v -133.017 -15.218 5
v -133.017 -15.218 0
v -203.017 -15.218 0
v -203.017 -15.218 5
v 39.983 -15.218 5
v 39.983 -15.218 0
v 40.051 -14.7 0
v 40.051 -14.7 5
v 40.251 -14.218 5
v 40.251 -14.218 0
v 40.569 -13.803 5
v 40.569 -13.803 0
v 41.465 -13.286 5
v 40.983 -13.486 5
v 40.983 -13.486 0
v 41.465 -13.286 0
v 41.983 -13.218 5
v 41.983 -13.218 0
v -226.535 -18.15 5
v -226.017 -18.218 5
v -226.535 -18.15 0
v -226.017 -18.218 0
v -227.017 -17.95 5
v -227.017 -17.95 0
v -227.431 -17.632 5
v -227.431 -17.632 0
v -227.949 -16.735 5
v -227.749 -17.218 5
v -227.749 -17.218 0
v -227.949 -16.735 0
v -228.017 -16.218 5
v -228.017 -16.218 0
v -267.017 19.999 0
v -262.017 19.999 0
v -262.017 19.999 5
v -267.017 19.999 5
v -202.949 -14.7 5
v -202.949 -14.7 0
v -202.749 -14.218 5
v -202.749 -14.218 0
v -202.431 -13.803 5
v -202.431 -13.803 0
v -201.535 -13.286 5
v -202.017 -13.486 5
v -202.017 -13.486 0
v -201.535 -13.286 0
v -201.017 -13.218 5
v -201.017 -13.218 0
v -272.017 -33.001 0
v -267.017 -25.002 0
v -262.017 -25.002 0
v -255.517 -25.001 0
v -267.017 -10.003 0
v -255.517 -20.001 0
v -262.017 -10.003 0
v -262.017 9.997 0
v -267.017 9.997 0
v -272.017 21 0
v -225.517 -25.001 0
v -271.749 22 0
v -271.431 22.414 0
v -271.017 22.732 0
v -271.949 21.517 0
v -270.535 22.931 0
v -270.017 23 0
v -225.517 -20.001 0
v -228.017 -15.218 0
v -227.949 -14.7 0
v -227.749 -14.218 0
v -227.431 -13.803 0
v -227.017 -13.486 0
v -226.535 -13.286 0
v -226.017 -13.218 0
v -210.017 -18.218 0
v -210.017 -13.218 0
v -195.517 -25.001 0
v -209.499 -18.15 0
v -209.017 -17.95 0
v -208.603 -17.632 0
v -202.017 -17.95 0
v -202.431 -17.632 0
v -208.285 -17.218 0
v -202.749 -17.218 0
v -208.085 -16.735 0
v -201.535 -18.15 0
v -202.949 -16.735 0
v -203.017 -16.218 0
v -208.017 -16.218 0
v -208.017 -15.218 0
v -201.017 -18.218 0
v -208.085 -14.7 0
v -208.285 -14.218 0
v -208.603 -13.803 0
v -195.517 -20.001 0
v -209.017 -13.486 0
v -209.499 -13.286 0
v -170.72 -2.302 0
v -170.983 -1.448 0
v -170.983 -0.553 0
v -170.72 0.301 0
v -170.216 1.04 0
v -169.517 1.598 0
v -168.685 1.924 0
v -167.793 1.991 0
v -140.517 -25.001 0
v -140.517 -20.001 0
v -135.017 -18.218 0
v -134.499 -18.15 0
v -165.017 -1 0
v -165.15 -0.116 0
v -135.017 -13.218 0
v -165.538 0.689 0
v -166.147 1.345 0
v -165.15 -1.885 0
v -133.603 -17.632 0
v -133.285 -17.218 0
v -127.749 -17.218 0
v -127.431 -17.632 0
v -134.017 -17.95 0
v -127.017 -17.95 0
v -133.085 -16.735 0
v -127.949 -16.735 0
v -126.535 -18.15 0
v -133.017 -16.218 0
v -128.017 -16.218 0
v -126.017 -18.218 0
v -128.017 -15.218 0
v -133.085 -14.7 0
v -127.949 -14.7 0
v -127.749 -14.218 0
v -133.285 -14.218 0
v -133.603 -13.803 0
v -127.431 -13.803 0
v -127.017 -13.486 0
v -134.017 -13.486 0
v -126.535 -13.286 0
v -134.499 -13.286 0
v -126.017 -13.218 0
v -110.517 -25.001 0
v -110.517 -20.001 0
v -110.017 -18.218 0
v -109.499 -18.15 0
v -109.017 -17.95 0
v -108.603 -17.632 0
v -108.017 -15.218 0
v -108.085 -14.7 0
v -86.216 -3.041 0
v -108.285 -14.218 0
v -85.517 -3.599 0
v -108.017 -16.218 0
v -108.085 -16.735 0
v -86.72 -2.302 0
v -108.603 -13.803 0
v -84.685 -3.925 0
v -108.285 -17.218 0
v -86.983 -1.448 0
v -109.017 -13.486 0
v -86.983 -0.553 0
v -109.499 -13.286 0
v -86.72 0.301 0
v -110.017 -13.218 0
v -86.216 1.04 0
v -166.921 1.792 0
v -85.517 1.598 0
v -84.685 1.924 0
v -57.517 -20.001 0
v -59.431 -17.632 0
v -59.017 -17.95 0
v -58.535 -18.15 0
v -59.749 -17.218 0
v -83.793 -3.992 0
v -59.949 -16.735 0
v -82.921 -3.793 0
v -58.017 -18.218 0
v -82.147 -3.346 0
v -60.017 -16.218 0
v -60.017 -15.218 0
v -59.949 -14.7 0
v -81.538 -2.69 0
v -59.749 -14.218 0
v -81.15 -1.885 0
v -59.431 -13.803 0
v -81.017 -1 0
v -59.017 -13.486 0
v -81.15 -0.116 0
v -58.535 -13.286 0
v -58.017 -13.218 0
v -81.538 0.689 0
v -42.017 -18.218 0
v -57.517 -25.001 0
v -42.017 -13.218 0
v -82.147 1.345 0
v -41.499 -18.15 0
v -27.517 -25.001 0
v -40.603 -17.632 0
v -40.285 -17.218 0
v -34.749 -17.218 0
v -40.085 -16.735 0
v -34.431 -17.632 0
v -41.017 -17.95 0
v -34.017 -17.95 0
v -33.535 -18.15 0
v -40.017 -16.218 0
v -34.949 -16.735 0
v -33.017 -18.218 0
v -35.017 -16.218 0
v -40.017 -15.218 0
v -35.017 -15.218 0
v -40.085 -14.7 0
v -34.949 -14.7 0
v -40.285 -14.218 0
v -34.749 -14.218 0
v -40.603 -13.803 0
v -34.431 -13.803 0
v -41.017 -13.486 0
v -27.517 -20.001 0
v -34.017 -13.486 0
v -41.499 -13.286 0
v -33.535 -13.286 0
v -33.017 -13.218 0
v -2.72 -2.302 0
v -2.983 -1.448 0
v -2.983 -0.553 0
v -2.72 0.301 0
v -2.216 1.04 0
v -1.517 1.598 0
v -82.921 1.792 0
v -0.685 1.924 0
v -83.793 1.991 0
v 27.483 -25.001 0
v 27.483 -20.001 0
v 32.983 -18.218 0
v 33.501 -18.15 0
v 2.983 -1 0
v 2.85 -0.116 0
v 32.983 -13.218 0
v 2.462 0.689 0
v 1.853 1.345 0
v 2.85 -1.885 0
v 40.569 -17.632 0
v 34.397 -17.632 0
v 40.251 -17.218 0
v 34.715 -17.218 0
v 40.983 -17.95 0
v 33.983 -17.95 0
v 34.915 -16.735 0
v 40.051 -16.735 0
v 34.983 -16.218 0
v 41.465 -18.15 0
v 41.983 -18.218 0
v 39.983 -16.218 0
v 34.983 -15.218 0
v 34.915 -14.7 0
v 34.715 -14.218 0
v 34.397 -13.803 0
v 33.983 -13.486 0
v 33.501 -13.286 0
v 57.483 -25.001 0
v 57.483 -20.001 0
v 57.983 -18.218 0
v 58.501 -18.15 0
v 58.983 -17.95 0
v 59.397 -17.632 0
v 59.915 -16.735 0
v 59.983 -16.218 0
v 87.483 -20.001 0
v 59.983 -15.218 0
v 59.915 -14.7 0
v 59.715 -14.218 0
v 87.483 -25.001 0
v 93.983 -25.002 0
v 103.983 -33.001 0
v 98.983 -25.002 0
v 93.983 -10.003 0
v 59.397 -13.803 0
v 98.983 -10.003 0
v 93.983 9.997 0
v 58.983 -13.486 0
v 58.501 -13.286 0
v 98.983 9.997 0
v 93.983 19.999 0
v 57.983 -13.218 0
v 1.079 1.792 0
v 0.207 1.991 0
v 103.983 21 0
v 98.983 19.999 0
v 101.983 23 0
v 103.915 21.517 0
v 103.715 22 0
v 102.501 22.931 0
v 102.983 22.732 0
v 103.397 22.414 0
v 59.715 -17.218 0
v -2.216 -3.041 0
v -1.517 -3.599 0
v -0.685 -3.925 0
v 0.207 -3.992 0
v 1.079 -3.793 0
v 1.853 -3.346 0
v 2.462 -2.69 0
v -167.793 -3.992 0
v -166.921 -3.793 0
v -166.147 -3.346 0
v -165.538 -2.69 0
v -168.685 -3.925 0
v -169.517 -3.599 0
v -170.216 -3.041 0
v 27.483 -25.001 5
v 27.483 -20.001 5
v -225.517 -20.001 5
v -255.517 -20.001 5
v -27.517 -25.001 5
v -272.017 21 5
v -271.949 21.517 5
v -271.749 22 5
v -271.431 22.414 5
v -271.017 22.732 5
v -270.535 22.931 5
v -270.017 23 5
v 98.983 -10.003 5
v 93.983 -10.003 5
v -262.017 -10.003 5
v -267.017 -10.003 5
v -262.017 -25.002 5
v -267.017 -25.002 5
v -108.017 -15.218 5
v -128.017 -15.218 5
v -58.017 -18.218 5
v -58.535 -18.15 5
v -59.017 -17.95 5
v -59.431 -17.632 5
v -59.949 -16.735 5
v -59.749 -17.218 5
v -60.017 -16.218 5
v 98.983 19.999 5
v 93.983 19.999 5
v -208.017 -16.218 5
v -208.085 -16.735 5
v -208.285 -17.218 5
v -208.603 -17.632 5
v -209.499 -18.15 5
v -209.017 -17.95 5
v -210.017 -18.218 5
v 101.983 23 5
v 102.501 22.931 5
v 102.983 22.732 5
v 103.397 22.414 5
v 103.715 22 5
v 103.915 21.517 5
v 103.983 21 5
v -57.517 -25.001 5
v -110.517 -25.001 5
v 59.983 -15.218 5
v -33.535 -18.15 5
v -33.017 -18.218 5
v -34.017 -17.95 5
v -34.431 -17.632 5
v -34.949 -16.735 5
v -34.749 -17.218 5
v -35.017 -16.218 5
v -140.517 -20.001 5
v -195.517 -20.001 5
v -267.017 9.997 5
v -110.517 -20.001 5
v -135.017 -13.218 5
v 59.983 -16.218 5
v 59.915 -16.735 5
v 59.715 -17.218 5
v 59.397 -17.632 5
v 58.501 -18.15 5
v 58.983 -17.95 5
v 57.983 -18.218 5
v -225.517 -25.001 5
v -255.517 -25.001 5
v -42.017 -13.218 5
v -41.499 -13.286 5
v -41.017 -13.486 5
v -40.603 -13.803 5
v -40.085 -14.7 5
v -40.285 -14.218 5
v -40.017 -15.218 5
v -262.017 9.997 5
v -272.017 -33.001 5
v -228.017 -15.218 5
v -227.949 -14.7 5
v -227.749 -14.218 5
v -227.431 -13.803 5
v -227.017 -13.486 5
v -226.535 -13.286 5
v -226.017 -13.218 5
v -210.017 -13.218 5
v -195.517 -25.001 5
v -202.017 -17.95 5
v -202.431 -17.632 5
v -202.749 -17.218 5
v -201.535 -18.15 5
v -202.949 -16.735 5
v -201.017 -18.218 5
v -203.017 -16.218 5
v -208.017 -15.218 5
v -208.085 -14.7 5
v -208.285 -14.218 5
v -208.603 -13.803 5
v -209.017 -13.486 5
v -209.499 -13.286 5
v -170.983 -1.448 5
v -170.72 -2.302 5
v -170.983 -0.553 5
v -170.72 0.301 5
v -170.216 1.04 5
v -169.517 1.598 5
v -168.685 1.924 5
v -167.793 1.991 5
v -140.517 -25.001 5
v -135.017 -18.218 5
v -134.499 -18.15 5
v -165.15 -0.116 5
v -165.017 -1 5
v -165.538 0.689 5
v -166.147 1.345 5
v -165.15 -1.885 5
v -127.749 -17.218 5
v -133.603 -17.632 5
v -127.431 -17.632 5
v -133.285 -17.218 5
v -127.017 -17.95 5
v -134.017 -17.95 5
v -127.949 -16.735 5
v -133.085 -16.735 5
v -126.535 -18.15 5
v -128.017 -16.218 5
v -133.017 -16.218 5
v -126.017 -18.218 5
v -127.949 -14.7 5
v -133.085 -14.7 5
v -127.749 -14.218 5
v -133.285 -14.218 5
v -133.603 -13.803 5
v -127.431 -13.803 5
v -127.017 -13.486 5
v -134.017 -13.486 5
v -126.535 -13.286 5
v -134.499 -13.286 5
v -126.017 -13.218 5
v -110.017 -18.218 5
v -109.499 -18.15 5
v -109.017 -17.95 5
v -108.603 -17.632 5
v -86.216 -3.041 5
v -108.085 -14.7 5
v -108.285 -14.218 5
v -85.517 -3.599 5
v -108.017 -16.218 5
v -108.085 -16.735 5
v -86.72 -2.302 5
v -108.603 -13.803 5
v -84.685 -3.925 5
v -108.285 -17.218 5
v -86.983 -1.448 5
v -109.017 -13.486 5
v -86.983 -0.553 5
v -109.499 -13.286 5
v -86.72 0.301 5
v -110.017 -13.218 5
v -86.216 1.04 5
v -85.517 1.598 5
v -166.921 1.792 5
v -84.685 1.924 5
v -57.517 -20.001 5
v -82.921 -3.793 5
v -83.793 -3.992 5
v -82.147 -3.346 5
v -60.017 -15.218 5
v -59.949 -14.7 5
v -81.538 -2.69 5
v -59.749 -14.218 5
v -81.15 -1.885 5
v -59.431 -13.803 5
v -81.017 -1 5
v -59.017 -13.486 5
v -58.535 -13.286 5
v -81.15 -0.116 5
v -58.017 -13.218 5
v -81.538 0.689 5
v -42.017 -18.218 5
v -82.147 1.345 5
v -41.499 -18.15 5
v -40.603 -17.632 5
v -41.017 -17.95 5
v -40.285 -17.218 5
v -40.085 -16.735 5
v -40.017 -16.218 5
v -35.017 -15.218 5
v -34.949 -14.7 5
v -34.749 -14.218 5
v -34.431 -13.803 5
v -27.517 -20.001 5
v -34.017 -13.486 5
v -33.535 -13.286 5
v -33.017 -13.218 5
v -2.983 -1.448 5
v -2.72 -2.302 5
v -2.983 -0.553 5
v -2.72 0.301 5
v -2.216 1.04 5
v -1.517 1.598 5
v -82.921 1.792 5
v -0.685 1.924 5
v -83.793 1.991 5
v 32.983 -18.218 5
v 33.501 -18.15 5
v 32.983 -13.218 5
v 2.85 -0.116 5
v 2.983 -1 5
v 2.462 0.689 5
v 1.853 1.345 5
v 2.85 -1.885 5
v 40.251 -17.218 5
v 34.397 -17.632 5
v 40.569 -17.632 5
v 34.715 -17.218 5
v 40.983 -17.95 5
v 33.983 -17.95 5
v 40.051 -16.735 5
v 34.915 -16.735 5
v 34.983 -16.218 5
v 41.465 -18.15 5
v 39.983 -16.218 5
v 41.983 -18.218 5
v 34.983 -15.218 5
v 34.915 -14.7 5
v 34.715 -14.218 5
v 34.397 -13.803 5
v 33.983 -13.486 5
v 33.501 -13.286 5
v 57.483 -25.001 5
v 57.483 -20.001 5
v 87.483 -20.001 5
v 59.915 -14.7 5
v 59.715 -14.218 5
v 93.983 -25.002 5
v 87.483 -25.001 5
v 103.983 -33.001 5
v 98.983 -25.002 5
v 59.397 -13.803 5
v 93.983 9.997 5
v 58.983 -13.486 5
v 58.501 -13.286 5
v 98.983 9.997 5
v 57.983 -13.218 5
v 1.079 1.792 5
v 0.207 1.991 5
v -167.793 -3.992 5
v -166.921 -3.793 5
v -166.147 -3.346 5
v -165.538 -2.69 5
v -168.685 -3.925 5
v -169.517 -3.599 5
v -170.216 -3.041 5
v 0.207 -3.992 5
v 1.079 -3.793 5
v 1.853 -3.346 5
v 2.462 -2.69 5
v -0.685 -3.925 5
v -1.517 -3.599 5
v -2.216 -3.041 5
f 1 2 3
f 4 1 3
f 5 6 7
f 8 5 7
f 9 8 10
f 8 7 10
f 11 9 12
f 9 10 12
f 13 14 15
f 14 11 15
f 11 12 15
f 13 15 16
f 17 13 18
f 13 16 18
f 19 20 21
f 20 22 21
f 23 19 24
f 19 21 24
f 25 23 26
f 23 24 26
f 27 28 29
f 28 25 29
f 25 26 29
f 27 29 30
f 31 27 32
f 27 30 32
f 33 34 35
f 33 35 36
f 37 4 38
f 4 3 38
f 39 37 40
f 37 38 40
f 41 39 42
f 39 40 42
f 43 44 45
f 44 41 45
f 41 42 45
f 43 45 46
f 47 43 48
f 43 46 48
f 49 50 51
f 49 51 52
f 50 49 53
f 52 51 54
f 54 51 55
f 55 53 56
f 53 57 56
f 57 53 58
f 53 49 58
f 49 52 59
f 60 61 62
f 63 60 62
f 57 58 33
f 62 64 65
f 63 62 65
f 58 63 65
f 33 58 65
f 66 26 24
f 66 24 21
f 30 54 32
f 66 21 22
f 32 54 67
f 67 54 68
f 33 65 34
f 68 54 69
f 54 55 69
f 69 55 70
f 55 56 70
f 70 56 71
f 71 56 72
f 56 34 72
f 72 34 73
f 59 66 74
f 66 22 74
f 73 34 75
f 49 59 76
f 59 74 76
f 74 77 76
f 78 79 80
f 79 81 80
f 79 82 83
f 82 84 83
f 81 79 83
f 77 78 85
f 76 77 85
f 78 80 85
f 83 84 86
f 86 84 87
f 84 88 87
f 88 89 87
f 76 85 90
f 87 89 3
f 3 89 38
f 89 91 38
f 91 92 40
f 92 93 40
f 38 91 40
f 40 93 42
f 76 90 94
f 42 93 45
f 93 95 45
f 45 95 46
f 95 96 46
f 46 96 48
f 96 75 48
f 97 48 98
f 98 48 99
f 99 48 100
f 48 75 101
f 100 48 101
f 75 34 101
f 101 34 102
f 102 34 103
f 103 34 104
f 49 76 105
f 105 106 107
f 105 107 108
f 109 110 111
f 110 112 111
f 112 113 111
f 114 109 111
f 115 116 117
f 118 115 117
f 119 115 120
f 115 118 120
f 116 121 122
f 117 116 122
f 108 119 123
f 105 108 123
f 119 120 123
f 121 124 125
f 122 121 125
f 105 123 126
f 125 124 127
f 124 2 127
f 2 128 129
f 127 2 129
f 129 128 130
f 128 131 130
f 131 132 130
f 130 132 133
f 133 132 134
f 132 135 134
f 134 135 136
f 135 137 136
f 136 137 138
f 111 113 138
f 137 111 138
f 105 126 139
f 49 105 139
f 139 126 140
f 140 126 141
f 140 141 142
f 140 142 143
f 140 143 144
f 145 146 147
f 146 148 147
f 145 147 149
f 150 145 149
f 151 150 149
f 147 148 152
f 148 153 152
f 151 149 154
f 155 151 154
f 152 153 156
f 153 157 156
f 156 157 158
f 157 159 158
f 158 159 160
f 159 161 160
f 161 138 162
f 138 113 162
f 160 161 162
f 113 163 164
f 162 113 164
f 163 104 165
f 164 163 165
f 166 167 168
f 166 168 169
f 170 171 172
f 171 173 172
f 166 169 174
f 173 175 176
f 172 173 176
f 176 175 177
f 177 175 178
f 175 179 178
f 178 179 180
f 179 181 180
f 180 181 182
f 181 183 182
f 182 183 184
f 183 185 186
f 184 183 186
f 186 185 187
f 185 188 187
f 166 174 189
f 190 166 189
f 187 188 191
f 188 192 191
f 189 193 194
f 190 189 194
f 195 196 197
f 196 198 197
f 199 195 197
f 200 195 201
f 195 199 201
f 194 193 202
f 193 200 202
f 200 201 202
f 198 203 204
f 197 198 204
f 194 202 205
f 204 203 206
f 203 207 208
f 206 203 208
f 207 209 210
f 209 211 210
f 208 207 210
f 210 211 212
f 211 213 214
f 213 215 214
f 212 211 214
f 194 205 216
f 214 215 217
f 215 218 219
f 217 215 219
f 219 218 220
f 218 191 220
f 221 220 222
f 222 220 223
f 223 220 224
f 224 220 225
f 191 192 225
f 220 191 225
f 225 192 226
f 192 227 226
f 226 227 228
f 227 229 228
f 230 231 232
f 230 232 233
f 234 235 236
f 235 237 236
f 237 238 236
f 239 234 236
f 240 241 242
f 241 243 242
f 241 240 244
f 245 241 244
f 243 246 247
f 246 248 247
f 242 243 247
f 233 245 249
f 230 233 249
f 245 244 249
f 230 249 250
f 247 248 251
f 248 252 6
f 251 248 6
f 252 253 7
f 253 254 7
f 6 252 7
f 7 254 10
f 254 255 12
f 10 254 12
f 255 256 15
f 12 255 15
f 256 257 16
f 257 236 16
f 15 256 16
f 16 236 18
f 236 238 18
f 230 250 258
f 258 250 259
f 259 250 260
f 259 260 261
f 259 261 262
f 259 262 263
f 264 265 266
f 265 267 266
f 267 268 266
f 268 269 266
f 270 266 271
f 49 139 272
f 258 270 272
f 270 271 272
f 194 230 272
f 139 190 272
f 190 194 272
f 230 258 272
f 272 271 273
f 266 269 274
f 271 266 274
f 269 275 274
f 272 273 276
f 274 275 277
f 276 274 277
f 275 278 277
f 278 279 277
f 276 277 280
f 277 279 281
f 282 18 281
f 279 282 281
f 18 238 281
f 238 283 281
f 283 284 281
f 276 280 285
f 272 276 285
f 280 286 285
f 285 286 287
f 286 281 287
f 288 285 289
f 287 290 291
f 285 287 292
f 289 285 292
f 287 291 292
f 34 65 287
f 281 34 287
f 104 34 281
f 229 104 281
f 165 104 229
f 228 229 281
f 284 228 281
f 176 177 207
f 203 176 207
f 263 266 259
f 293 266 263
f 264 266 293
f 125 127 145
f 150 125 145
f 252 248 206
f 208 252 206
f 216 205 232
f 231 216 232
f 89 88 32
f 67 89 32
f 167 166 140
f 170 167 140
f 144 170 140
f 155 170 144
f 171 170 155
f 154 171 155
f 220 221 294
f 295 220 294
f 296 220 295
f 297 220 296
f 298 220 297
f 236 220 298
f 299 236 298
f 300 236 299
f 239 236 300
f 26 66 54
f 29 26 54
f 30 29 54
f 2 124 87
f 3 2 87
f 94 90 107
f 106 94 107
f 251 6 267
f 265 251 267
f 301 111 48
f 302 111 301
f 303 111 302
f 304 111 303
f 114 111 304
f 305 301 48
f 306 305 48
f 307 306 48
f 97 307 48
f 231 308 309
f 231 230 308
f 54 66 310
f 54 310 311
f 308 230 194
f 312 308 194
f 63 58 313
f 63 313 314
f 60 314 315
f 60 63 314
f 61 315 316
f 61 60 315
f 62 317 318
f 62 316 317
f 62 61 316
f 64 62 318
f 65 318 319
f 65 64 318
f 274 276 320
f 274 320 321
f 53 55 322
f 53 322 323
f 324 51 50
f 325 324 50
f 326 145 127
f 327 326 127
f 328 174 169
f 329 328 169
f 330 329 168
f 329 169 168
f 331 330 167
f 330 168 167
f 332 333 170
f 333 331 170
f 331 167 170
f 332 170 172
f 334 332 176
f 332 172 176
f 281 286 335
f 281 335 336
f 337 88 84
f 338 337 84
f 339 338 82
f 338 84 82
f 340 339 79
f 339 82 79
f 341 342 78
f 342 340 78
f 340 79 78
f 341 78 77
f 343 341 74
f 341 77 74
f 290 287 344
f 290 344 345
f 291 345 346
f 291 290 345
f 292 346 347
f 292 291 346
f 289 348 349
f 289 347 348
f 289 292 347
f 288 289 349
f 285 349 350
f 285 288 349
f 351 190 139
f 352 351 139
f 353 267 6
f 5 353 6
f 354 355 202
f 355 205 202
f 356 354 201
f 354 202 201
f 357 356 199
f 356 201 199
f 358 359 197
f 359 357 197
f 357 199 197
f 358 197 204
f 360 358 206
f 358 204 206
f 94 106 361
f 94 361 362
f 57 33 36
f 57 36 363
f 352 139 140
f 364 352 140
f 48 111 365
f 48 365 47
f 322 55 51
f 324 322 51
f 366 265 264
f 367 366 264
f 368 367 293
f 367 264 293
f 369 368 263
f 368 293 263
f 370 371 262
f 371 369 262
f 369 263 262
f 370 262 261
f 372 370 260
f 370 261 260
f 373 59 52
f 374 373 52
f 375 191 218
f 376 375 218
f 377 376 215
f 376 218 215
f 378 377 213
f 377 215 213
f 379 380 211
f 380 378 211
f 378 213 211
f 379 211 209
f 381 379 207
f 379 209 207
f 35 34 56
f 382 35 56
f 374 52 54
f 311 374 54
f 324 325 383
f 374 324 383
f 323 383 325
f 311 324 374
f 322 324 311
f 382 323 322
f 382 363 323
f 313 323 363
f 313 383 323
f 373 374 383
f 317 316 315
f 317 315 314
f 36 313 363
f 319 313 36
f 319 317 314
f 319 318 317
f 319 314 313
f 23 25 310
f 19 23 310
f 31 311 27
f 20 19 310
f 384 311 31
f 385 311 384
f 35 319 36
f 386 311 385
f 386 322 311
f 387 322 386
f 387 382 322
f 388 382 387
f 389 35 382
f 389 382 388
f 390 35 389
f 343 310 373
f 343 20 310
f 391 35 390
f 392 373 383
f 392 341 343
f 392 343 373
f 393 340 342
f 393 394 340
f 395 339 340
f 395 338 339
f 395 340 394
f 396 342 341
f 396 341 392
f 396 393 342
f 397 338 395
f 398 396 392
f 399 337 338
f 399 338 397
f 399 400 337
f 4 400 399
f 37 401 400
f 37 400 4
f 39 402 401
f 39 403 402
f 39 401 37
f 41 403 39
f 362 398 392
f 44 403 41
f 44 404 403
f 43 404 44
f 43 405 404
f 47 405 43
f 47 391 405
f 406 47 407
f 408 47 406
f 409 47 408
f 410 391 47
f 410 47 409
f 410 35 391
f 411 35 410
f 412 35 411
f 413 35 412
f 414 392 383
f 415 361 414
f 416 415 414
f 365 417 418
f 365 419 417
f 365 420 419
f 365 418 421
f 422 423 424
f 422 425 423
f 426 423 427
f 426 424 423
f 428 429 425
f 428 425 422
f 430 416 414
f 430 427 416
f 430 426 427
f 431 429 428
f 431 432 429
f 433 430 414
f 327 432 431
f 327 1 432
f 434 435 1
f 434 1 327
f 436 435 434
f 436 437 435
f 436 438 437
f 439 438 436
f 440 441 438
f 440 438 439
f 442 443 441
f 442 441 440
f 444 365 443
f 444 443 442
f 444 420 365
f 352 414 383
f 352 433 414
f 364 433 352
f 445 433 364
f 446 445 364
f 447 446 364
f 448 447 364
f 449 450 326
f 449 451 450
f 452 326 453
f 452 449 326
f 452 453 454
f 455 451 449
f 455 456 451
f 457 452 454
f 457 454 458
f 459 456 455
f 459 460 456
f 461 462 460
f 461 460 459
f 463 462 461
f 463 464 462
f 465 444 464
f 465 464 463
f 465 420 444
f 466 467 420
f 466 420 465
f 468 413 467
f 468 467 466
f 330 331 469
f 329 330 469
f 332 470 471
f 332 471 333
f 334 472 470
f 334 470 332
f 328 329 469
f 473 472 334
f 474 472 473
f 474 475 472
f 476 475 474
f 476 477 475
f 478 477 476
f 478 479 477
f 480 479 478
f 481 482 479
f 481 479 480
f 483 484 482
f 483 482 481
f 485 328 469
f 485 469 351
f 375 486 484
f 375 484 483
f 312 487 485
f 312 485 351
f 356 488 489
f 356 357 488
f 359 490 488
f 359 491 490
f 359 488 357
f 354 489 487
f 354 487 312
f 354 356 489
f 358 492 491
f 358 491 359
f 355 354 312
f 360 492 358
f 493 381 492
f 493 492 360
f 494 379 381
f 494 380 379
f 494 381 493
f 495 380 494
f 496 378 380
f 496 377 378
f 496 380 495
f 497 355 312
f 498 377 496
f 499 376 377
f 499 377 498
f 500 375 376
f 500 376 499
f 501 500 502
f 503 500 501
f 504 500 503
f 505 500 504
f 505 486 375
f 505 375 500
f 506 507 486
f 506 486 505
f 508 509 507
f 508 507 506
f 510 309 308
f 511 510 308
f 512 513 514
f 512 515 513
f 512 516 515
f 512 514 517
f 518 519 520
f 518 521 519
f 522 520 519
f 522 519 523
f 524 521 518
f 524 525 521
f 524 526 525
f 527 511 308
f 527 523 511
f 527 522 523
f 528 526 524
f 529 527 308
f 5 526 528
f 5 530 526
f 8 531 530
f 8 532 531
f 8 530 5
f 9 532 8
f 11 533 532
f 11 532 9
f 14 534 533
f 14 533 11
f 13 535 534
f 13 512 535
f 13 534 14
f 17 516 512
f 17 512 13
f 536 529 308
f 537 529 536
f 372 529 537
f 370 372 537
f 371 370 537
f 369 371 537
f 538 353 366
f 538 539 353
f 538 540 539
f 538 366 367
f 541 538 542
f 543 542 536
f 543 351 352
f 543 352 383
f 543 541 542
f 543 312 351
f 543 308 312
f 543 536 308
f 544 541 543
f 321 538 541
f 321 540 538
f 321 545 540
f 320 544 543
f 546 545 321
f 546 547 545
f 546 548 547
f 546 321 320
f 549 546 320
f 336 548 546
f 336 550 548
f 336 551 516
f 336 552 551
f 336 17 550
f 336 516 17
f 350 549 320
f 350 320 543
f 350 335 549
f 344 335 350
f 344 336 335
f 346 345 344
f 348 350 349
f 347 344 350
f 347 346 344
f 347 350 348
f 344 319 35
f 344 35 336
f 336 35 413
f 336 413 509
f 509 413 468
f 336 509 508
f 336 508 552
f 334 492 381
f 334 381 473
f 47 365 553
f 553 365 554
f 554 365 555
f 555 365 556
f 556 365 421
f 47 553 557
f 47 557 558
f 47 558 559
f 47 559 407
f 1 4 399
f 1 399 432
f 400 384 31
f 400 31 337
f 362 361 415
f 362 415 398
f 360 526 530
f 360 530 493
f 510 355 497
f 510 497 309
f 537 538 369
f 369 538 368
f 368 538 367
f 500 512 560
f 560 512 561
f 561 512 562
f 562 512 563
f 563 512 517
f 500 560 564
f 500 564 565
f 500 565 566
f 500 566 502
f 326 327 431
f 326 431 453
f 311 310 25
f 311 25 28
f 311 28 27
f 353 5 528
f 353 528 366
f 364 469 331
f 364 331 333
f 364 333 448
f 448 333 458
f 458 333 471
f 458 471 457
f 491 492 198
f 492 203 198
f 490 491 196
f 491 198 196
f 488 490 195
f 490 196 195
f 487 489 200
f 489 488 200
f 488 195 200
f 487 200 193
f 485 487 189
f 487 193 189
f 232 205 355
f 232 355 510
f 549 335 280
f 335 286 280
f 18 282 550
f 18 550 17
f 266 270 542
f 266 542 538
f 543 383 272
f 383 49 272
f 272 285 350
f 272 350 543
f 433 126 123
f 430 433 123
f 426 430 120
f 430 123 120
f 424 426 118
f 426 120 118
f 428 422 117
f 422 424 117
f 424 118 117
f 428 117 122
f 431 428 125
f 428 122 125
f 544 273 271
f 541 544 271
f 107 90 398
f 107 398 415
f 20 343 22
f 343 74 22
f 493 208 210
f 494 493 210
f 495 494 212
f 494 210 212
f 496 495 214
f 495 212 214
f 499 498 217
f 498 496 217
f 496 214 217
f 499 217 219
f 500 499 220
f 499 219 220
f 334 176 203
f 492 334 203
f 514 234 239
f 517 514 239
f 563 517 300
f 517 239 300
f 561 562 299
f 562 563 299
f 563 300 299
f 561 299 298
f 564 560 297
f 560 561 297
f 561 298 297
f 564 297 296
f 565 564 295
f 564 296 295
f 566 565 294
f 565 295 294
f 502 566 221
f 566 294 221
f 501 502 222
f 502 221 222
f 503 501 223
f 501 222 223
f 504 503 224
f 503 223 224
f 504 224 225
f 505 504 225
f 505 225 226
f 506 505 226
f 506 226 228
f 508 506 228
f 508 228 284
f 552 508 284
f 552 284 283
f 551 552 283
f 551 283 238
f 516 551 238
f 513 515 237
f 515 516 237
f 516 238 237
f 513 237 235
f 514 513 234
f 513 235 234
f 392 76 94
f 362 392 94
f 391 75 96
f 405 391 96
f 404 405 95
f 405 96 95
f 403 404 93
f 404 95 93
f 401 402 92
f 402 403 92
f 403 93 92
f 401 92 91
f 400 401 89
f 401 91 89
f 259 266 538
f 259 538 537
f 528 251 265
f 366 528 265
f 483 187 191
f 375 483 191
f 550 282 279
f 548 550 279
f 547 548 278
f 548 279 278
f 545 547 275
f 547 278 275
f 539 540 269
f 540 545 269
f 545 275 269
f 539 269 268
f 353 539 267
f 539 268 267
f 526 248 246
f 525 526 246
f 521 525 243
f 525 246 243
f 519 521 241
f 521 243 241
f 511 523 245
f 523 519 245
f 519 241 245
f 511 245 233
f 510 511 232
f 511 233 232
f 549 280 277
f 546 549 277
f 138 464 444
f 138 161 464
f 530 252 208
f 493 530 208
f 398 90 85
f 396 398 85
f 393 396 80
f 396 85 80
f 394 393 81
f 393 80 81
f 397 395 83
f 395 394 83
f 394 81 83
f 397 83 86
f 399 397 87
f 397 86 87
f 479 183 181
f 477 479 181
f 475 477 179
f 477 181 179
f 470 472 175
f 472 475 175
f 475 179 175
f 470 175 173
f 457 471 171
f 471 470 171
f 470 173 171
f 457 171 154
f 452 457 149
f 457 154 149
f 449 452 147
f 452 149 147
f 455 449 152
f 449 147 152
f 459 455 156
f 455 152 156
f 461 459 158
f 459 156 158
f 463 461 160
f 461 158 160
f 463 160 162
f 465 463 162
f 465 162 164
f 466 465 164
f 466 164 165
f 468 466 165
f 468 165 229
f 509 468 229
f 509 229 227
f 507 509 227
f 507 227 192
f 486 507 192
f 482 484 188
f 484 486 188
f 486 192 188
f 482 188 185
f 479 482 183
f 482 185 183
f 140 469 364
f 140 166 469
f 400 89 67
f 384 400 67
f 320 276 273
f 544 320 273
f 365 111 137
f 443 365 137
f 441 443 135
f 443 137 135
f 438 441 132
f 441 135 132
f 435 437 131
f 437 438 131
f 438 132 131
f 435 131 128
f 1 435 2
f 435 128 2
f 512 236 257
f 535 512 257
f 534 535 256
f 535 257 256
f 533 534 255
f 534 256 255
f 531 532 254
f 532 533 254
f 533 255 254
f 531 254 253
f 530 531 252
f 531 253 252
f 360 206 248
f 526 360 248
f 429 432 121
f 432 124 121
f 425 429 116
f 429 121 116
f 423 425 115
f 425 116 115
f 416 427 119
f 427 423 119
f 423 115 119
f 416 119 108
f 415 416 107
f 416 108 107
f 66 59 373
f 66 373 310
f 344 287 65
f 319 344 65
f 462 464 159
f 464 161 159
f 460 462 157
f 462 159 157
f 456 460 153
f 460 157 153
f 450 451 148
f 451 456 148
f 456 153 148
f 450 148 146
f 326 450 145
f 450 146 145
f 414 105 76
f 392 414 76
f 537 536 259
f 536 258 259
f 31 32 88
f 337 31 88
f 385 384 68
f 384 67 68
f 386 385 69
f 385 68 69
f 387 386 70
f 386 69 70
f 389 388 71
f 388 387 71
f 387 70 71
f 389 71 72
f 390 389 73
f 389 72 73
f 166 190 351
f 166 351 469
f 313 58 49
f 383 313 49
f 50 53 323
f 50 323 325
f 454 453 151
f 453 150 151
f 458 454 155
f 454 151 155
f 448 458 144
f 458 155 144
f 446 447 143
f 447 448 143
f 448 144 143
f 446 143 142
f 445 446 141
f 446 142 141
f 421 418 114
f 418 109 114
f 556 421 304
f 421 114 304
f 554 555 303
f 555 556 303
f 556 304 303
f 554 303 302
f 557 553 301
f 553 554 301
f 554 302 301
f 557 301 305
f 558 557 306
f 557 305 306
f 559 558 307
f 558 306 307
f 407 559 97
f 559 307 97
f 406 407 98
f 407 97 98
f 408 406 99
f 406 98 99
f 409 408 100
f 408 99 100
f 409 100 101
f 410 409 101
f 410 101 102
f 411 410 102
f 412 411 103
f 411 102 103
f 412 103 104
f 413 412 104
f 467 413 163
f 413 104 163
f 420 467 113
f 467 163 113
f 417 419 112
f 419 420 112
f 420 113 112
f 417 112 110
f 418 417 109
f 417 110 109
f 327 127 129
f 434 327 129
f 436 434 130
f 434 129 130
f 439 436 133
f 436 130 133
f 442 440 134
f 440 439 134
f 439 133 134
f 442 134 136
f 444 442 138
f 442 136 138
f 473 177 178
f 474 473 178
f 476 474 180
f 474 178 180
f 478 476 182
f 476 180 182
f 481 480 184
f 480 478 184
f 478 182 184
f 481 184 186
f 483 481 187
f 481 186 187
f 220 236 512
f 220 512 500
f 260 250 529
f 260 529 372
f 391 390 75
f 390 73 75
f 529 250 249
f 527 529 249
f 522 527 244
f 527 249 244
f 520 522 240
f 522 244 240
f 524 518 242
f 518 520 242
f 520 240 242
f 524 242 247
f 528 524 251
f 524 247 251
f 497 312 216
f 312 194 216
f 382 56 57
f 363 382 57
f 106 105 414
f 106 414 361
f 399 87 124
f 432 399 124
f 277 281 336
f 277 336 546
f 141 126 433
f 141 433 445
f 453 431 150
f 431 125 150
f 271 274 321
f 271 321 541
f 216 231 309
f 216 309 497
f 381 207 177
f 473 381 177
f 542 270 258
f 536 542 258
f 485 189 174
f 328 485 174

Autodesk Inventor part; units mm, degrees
ref_plane "YZ Plane" through (0, 0, 0) normal (1, 0, 0) x (0, 1, 0)
ref_plane "XZ Plane" through (0, 0, 0) normal (0, 1, 0) x (-1, 0, 0)
ref_plane "XY Plane" through (0, 0, 0) normal (0, 0, 1) x (1, 0, 0)
sketch "Sketch1" plane through (0, 0, 0) normal (0, 0, 1) x (1, 0, 0)
  line L0 (57.983, -13.2177) -> (41.983, -13.2177)
  line L1 (41.983, -18.2177) -> (57.983, -18.2177)
  line L2 (-58.017, -13.2177) -> (-42.017, -13.2177)
  line L3 (-42.017, -18.2177) -> (-58.017, -18.2177)
  line L4 (32.983, -13.2177) -> (-33.017, -13.2177)
  line L5 (-33.017, -18.2177) -> (32.983, -18.2177)
  arc A0 (34.983, -15.2177) -> (32.983, -13.2177) centre (32.983, -15.2177) ccw
  arc A1 (-35.017, -16.2177) -> (-33.017, -18.2177) centre (-33.017, -16.2177) ccw
  arc A2 (-33.017, -13.2177) -> (-35.017, -15.2177) centre (-33.017, -15.2177) ccw
  arc A3 (-40.017, -15.2177) -> (-42.017, -13.2177) centre (-42.017, -15.2177) ccw
  arc A4 (-42.017, -18.2177) -> (-40.017, -16.2177) centre (-42.017, -16.2177) ccw
  arc A5 (-60.017, -16.2177) -> (-58.017, -18.2177) centre (-58.017, -16.2177) ccw
  arc A6 (-58.017, -13.2177) -> (-60.017, -15.2177) centre (-58.017, -15.2177) ccw
  arc A7 (39.983, -16.2177) -> (41.983, -18.2177) centre (41.983, -16.2177) ccw
  arc A8 (41.983, -13.2177) -> (39.983, -15.2177) centre (41.983, -15.2177) ccw
  arc A9 (59.983, -15.2177) -> (57.983, -13.2177) centre (57.983, -15.2177) ccw
  arc A10 (57.983, -18.2177) -> (59.983, -16.2177) centre (57.983, -16.2177) ccw
  arc A11 (32.983, -18.2177) -> (34.983, -16.2177) centre (32.983, -16.2177) ccw
  line L6 (59.983, -15.2177) -> (39.983, -15.2177)
  line L7 (39.983, -16.2177) -> (59.983, -16.2177)
  line L8 (34.983, -15.2177) -> (-35.017, -15.2177)
  line L9 (-35.017, -16.2177) -> (34.983, -16.2177)
  line L10 (-40.017, -15.2177) -> (-60.017, -15.2177)
  line L11 (-60.017, -16.2177) -> (-40.017, -16.2177)
  line L12 (-57.517, -25.0011) -> (-110.517, -25.0011) projected
  line L13 (-110.517, -25.0011) -> (-110.517, -20.0011) projected
  line L14 (-57.517, -20.0011) -> (-110.517, -20.0011) projected
  line L15 (-57.517, -25.0011) -> (-57.517, -20.0011) projected
  line L16 (-140.517, -25.0011) -> (-195.517, -25.0011) projected
  line L17 (-195.517, -25.0011) -> (-195.517, -20.0011) projected
  line L18 (-140.517, -20.0011) -> (-195.517, -20.0011) projected
  line L19 (-140.517, -25.0011) -> (-140.517, -20.0011) projected
  line L20 (-225.517, -25.0011) -> (-255.517, -25.0011) projected
  line L21 (-255.517, -25.0011) -> (-255.517, -20.0011) projected
  line L22 (-225.517, -20.0011) -> (-255.517, -20.0011) projected
  line L23 (-225.517, -25.0011) -> (-225.517, -20.0011) projected
  line L24 (-272.017, -33.0013) -> (103.983, -33.0013)
  line L25 (98.983, 19.9989) -> (98.983, 9.9974) projected
  line L26 (98.983, 9.9974) -> (93.983, 9.9974) projected
  line L27 (93.983, 19.9989) -> (93.983, 9.9974) projected
  line L28 (98.983, 19.9989) -> (93.983, 19.9989) projected
  line L29 (98.983, -10.0026) -> (98.983, -25.0018) projected
  line L30 (98.983, -25.0018) -> (93.983, -25.0018) projected
  line L31 (93.983, -10.0026) -> (93.983, -25.0018) projected
  line L32 (98.983, -10.0026) -> (93.983, -10.0026) projected
  line L33 (-262.017, -10.0026) -> (-262.017, -25.0018) projected
  line L34 (-262.017, -25.0018) -> (-267.017, -25.0018) projected
  line L35 (-267.017, -10.0026) -> (-267.017, -25.0018) projected
  line L36 (-262.017, -10.0026) -> (-267.017, -10.0026) projected
  line L37 (-262.017, 19.9989) -> (-262.017, 9.9974) projected
  line L38 (-262.017, 9.9974) -> (-267.017, 9.9974) projected
  line L39 (-267.017, 19.9989) -> (-267.017, 9.9974) projected
  line L40 (-262.017, 19.9989) -> (-267.017, 19.9989) projected
  line L41 (-110.017, -13.2177) -> (-126.017, -13.2177)
  line L42 (-126.017, -18.2177) -> (-110.017, -18.2177)
  line L43 (-226.017, -13.2177) -> (-210.017, -13.2177)
  line L44 (-210.017, -18.2177) -> (-226.017, -18.2177)
  line L45 (-135.017, -13.2177) -> (-201.017, -13.2177)
  line L46 (-201.017, -18.2177) -> (-135.017, -18.2177)
  arc A12 (-133.017, -15.2177) -> (-135.017, -13.2177) centre (-135.017, -15.2177) ccw
  arc A13 (-203.017, -16.2177) -> (-201.017, -18.2177) centre (-201.017, -16.2177) ccw
  arc A14 (-201.017, -13.2177) -> (-203.017, -15.2177) centre (-201.017, -15.2177) ccw
  arc A15 (-208.017, -15.2177) -> (-210.017, -13.2177) centre (-210.017, -15.2177) ccw
  arc A16 (-210.017, -18.2177) -> (-208.017, -16.2177) centre (-210.017, -16.2177) ccw
  arc A17 (-228.017, -16.2177) -> (-226.017, -18.2177) centre (-226.017, -16.2177) ccw
  arc A18 (-226.017, -13.2177) -> (-228.017, -15.2177) centre (-226.017, -15.2177) ccw
  arc A19 (-128.017, -16.2177) -> (-126.017, -18.2177) centre (-126.017, -16.2177) ccw
  arc A20 (-126.017, -13.2177) -> (-128.017, -15.2177) centre (-126.017, -15.2177) ccw
  arc A21 (-108.017, -15.2177) -> (-110.017, -13.2177) centre (-110.017, -15.2177) ccw
  arc A22 (-110.017, -18.2177) -> (-108.017, -16.2177) centre (-110.017, -16.2177) ccw
  arc A23 (-135.017, -18.2177) -> (-133.017, -16.2177) centre (-135.017, -16.2177) ccw
  line L47 (-108.017, -15.2177) -> (-128.017, -15.2177)
  line L48 (-128.017, -16.2177) -> (-108.017, -16.2177)
  line L49 (-133.017, -15.2177) -> (-203.017, -15.2177)
  line L50 (-203.017, -16.2177) -> (-133.017, -16.2177)
  line L51 (-208.017, -15.2177) -> (-228.017, -15.2177)
  line L52 (-228.017, -16.2177) -> (-208.017, -16.2177)
  line L53 (87.483, -25.0011) -> (57.483, -25.0011) projected
  line L54 (57.483, -25.0011) -> (57.483, -20.0011) projected
  line L55 (87.483, -20.0011) -> (57.483, -20.0011) projected
  line L56 (87.483, -25.0011) -> (87.483, -20.0011) projected
  line L57 (27.483, -25.0011) -> (-27.517, -25.0011) projected
  line L58 (-27.517, -25.0011) -> (-27.517, -20.0011) projected
  line L59 (27.483, -20.0011) -> (-27.517, -20.0011) projected
  line L60 (27.483, -25.0011) -> (27.483, -20.0011) projected
  circle A24 centre (-84.017, -1.0005) radius 3
  line L61 (103.983, 20.9995) -> (103.983, -33.0013)
  circle A25 centre (-0.017, -1.0005) radius 3
  line L62 (-272.017, 20.9995) -> (-272.017, -33.0013)
  circle A26 centre (-168.017, -1.0005) radius 3
  line L63 (101.983, 22.9995) -> (-270.017, 22.9995)
  arc A27 (103.983, 20.9995) -> (101.983, 22.9995) centre (101.983, 20.9995) ccw
  arc A28 (-270.017, 22.9995) -> (-272.017, 20.9995) centre (-270.017, 20.9995) ccw
  point P0 (103.983, 22.9995)
  point P1 (59.983, -13.2177)
  point P2 (59.983, -18.2177)
  point P3 (59.983, -16.2177)
  point P4 (-108.017, -13.2177)
  point P5 (-108.017, -18.2177)
  point P6 (-272.017, 22.9995)
  dimension "d17" = 5
  dimension "d27" = 2
  dimension "d36" = 5
  dimension "d37" = 2
  dimension "d39" = 6
  dimension "d40" = 6
  dimension "d42" = 188
  dimension "d44" = 376
  dimension "d45" = 188
  dimension "d46" = 84
  dimension "d47" = 6
  dimension "d48" = 84
  dimension "d50" = 2
extrude "Extrusion1" add sketch "Sketch1" along normal blind 5
properties part number "case top front" material "ABS Plastic"
